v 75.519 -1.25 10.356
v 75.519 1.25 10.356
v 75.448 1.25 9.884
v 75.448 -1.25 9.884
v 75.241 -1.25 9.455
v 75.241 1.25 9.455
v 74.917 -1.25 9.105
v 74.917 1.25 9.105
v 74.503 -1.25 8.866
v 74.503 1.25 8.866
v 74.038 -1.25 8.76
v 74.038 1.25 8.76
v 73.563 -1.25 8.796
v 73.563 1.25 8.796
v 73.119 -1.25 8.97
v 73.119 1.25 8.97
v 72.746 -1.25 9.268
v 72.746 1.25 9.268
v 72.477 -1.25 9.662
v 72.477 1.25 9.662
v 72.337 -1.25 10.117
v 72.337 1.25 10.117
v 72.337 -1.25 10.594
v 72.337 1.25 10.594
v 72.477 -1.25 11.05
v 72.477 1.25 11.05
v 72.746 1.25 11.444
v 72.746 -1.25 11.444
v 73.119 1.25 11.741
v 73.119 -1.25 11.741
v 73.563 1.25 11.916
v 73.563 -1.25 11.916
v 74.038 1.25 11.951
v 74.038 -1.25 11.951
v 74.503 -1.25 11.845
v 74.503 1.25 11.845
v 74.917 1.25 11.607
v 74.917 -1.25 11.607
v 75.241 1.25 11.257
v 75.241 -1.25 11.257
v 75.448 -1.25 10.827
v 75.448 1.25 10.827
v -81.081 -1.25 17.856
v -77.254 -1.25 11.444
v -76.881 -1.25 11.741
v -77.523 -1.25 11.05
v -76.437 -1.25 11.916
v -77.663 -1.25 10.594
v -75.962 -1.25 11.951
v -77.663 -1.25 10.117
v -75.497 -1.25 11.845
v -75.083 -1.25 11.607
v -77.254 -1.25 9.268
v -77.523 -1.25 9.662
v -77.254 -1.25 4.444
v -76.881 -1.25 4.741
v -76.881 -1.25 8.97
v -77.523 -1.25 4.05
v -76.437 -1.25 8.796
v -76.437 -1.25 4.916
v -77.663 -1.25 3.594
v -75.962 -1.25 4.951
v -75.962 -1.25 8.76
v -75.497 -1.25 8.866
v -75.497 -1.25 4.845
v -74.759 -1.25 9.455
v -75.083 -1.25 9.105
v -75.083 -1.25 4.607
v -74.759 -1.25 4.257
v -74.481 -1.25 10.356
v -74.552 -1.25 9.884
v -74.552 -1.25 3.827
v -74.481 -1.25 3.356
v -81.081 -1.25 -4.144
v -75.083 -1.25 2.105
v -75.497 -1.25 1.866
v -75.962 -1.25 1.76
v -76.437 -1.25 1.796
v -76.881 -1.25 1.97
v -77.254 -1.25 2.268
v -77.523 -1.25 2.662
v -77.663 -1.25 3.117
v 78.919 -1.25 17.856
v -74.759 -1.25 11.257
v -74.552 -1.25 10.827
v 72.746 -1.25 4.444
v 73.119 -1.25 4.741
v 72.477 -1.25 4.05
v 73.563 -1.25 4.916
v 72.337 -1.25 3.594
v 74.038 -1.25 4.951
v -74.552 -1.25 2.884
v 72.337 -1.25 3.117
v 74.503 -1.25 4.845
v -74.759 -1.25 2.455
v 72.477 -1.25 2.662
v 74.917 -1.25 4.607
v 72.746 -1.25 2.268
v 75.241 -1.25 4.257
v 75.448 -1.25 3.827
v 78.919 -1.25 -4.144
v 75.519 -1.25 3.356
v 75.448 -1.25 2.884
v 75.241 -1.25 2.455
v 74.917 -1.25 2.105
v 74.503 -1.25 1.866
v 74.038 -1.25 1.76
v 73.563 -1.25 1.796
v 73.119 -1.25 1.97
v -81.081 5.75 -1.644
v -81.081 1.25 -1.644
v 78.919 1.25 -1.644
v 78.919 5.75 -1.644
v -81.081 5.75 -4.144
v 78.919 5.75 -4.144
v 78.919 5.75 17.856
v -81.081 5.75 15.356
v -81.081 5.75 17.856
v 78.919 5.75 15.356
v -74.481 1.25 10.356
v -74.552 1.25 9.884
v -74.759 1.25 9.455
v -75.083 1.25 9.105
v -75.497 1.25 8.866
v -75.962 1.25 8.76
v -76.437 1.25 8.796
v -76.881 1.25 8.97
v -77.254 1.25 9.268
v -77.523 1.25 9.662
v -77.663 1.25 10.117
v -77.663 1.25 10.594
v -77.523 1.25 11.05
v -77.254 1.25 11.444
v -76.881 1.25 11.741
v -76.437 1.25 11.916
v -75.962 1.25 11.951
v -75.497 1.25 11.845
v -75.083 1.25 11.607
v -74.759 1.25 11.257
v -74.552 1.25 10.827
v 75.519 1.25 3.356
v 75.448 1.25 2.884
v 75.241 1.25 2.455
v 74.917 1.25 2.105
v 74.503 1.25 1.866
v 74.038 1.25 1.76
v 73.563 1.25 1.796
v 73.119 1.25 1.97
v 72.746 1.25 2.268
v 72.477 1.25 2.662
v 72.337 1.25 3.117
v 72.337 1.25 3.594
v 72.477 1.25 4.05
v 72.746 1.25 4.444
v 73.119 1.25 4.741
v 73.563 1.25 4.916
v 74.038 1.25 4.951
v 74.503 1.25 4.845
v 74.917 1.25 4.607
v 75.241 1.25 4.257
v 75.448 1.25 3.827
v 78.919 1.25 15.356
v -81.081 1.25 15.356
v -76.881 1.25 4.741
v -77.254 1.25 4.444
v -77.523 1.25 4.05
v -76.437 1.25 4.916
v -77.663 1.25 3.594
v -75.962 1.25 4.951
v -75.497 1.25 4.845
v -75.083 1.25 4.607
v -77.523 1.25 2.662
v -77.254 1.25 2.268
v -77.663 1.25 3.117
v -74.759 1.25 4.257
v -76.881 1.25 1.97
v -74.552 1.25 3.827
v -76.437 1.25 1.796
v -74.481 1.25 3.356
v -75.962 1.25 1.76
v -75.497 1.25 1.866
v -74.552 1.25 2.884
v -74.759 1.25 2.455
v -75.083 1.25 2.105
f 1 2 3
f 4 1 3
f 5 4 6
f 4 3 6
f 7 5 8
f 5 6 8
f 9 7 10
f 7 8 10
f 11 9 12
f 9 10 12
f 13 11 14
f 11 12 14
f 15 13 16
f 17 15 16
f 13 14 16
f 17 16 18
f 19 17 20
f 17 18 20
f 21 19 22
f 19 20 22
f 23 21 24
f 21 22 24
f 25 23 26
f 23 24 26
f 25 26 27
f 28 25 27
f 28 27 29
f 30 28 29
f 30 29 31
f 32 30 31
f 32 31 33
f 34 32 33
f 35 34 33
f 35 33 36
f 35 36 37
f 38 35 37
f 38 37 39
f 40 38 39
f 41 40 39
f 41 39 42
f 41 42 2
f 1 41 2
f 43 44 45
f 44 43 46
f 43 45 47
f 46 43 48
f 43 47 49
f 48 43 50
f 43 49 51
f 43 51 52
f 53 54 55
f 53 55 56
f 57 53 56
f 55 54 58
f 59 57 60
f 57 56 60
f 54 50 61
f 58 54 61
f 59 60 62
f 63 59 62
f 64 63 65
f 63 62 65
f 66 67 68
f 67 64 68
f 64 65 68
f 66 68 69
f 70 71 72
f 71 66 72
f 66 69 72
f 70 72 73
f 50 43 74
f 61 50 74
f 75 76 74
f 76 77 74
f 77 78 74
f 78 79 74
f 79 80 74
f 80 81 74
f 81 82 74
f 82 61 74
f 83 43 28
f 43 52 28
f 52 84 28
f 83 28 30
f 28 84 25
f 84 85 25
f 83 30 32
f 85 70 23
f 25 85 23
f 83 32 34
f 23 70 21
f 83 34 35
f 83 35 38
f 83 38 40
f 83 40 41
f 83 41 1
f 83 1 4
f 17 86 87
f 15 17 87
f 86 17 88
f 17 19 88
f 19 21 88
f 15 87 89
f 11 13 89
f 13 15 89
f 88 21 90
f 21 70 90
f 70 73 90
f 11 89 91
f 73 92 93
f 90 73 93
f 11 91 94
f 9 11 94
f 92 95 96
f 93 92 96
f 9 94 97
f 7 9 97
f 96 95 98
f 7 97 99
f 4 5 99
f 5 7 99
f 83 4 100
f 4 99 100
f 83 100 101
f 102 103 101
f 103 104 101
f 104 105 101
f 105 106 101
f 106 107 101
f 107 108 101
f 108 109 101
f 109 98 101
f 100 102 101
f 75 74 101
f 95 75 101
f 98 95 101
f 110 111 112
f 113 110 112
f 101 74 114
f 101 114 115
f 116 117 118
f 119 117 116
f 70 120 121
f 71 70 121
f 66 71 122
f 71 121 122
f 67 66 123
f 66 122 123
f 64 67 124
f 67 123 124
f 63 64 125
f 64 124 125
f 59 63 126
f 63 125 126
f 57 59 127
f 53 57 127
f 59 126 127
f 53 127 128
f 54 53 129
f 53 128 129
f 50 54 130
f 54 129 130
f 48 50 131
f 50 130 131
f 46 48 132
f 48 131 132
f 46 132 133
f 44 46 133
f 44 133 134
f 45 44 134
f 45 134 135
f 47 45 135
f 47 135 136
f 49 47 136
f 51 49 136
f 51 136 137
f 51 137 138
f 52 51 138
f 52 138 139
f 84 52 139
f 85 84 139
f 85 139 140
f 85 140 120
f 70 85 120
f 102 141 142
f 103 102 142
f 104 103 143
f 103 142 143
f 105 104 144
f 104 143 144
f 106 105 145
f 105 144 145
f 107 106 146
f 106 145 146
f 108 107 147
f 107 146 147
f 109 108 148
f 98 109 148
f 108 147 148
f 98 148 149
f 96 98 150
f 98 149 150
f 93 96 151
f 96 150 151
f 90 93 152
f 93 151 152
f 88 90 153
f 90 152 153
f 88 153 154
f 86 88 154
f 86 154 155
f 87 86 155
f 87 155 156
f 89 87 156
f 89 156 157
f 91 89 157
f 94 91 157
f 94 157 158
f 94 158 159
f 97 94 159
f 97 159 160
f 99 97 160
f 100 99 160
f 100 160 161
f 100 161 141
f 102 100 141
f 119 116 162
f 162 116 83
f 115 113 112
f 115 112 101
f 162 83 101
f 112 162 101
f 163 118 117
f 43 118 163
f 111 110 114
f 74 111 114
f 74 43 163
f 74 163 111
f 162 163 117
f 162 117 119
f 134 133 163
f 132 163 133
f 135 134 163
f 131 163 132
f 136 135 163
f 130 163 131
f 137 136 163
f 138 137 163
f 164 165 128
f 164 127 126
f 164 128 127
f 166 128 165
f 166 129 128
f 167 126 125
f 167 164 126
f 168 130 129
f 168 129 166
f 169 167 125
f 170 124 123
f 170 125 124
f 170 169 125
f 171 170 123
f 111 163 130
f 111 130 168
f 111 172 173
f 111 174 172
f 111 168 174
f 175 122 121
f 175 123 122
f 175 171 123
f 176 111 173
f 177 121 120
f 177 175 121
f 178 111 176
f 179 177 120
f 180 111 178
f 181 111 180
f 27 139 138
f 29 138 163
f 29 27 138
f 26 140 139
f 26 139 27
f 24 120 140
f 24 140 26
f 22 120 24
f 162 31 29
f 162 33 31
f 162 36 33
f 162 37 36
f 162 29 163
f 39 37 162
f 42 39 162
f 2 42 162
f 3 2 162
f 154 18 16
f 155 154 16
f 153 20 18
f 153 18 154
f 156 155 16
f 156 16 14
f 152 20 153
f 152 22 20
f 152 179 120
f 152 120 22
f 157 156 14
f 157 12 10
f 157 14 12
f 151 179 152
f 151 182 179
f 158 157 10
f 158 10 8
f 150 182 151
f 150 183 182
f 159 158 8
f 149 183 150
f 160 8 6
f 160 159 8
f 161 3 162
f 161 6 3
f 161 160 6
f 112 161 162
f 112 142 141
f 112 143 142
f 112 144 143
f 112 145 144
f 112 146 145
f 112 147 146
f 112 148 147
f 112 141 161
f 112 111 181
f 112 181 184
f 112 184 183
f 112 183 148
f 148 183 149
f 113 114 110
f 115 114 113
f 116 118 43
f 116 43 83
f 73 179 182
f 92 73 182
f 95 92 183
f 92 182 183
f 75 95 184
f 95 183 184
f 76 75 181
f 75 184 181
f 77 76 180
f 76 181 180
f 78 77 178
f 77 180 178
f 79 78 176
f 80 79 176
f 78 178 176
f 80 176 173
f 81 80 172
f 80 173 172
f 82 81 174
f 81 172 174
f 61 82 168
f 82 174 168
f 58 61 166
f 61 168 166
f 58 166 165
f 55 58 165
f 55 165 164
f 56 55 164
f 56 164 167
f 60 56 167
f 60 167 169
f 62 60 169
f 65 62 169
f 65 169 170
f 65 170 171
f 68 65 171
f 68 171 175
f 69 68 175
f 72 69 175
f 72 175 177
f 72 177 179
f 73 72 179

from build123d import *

# Parameters (mm, degrees)
SKETCH1_W           = 160
SKETCH1_H           = 22
BOSS_EXTRUDE1_DEPTH = 1.25
SKETCH2_W           = 160
SKETCH2_H           = 2.5
BOSS_EXTRUDE2_DEPTH = 4.5
SKETCH4_R           = 1.6
CUT_EXTRUDE1_DEPTH  = 3.5


with BuildPart() as part:
    # Sketch1 → Boss-Extrude1 (new body, symmetric)
    with BuildSketch(Plane(origin=(0, 0, 0), x_dir=(1, 0, 0), z_dir=(0, 1, 0))):
        with Locations((-1.081081081, -6.855855856)):
            Rectangle(SKETCH1_W, SKETCH1_H)
    extrude(amount=BOSS_EXTRUDE1_DEPTH, both=True)

    # Sketch2 → Boss-Extrude2 (add)
    with BuildSketch(Plane(origin=(0, 1.25, 0), x_dir=(1, 0, 0), z_dir=(0, 1, 0))):
        with Locations((-1.081081081, 2.894144144)):
            Rectangle(SKETCH2_W, SKETCH2_H)
        with Locations((-1.081081081, -16.605855856)):
            Rectangle(SKETCH2_W, SKETCH2_H)
    extrude(amount=BOSS_EXTRUDE2_DEPTH)

    # Sketch4 → Cut-Extrude1 (cut, through all)
    with BuildSketch(Plane(origin=(0, 1.25, 0), x_dir=(1, 0, 0), z_dir=(0, 1, 0))):
        with Locations((73.918918919, -3.355855856)):
            Circle(SKETCH4_R)
        with Locations((73.918918919, -10.355855856)):
            Circle(SKETCH4_R)
        with Locations((-76.081081081, -10.355855856)):
            Circle(SKETCH4_R)
        with Locations((-76.081081081, -3.355855856)):
            Circle(SKETCH4_R)
    extrude(amount=-CUT_EXTRUDE1_DEPTH, mode=Mode.SUBTRACT)


solid = part.part
